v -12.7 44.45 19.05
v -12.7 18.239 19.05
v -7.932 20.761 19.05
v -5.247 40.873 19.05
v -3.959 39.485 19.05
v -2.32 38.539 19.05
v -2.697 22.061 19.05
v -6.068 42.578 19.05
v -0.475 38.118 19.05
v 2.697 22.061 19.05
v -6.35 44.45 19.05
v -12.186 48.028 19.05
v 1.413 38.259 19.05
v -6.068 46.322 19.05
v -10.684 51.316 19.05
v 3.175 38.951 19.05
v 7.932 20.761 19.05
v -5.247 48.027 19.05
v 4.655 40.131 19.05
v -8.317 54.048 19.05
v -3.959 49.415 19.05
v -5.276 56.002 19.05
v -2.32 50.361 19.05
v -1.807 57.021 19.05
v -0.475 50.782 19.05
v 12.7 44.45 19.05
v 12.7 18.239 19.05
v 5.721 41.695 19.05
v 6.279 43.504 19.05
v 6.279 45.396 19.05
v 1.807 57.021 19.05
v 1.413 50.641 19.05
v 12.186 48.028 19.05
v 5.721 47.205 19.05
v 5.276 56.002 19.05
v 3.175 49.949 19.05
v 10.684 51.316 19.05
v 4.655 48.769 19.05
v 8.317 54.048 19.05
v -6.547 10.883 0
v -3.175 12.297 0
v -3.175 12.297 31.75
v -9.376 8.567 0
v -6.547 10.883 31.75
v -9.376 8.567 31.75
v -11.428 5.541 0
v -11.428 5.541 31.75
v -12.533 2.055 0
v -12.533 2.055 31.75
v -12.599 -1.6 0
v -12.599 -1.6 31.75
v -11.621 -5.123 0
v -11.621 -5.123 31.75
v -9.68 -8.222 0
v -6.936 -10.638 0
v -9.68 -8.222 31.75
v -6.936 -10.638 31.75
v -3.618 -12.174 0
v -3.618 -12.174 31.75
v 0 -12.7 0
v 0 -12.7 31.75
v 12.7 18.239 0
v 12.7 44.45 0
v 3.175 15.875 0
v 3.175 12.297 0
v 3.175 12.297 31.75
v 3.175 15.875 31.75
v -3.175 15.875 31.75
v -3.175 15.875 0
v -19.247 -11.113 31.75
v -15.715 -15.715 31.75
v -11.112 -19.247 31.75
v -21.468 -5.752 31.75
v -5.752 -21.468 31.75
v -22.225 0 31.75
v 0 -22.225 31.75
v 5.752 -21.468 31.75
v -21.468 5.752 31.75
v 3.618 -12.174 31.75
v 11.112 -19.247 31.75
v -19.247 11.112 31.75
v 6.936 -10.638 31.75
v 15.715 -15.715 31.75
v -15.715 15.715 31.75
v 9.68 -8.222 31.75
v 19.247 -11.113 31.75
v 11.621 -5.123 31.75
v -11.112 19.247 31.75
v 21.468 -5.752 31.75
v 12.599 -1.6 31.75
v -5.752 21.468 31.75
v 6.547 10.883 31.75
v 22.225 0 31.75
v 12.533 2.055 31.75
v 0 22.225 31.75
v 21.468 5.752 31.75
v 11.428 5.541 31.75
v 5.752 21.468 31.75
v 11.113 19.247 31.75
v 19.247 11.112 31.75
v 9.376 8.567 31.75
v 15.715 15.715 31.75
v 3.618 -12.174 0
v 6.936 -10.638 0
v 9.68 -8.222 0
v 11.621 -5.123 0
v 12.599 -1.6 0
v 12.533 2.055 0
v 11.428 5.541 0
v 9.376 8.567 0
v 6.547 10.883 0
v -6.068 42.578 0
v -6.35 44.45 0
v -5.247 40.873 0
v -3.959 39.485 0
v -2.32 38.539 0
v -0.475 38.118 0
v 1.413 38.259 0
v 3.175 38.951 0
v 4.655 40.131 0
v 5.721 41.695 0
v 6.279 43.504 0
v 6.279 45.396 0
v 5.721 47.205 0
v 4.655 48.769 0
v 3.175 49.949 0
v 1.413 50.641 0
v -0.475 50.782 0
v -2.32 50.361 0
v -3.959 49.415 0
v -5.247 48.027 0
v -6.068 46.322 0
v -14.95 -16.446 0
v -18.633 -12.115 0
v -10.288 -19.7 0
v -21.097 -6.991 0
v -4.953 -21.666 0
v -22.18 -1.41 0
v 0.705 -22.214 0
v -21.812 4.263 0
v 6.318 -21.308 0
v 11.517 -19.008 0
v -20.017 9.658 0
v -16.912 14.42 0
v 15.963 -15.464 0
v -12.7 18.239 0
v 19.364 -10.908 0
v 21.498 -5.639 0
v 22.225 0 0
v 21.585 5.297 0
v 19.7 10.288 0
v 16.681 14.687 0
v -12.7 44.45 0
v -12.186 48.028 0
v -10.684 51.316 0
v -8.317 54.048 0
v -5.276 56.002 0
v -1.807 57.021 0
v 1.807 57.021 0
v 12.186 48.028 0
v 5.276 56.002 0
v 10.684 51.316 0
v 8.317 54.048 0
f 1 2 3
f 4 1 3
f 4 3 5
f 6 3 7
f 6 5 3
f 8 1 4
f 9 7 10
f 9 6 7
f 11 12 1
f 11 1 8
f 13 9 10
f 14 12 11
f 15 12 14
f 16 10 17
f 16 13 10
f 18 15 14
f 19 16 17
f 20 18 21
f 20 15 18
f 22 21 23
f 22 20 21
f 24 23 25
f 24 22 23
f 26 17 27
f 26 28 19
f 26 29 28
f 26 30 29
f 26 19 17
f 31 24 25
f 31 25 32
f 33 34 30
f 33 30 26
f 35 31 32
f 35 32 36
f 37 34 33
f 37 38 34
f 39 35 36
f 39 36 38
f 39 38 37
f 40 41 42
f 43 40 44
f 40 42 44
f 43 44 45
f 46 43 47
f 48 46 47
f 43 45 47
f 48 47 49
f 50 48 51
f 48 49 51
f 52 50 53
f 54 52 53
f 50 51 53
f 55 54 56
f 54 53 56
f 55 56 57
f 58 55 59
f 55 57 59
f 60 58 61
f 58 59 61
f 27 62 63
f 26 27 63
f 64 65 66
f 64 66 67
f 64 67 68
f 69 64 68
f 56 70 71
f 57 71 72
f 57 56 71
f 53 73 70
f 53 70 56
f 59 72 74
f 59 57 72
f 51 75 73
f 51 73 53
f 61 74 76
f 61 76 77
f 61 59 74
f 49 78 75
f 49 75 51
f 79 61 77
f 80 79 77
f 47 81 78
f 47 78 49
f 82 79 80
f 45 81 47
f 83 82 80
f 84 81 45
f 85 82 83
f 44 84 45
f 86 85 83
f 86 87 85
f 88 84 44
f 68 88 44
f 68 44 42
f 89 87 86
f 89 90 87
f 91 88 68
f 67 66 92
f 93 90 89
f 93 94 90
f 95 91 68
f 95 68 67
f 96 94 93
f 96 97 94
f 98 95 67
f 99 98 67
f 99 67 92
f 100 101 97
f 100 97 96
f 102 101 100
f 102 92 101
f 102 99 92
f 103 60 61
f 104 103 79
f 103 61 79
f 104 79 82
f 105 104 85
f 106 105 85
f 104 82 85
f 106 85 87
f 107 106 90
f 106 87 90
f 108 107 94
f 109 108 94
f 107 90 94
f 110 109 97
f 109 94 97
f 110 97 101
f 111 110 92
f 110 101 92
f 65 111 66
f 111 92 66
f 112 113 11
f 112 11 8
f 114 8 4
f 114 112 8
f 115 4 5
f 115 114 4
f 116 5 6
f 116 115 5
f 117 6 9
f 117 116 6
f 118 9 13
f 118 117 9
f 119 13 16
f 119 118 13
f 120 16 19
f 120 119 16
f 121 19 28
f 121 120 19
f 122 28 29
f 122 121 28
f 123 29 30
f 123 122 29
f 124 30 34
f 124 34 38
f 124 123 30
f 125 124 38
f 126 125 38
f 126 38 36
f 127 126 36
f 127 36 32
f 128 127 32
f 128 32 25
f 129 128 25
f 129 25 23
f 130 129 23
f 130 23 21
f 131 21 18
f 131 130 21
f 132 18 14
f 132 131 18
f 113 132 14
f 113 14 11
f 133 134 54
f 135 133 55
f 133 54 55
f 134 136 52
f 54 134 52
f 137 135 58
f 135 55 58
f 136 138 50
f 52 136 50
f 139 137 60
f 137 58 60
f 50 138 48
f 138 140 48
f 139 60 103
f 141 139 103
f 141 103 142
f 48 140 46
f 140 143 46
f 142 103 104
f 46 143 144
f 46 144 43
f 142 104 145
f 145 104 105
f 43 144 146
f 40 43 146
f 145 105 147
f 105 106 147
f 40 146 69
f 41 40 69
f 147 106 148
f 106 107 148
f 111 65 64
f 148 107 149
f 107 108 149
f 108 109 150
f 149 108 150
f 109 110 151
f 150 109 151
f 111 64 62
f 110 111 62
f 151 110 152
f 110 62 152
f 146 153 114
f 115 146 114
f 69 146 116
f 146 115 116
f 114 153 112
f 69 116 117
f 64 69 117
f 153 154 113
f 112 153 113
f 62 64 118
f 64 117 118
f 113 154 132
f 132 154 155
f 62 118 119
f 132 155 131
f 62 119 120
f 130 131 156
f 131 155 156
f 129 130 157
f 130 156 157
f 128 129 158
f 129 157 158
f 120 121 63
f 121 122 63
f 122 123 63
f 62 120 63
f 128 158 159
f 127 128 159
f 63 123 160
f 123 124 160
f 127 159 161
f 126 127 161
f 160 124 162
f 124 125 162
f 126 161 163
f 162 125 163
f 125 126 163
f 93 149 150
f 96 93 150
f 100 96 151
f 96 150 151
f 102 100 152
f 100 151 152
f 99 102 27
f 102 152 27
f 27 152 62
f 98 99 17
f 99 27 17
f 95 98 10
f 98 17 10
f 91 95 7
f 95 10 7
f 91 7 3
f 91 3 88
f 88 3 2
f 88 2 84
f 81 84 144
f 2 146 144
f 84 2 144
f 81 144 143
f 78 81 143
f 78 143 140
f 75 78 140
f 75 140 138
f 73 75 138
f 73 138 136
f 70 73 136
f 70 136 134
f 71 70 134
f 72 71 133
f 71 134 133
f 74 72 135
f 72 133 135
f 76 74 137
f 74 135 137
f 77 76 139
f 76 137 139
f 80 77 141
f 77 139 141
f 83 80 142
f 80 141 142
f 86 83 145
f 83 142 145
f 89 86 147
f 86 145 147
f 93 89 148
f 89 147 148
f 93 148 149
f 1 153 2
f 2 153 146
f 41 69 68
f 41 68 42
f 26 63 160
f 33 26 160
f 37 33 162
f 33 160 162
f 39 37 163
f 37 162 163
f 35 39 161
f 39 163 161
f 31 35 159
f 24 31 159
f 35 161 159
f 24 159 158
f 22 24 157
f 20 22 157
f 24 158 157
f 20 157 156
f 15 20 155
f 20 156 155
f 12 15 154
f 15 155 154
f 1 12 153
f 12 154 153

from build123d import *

# Parameters (mm, degrees)
SKETCH1_R           = 22.225
BOSS_EXTRUDE1_DEPTH = 31.75
SKETCH1_3_R         = 6.35
BOSS_EXTRUDE2_DEPTH = 19.05
CUT_EXTRUDE1_DEPTH  = 70.051688068


with BuildPart() as part:
    # Sketch1 → Boss-Extrude1 (new body)
    with BuildSketch(Plane.XY):
        Circle(SKETCH1_R)
    extrude(amount=BOSS_EXTRUDE1_DEPTH)

    # Sketch1<3> → Boss-Extrude2 (add)
    with BuildSketch(Plane.XY):
        with BuildLine():
            ThreePointArc((12.7, 44.45), (0, 57.15), (-12.7, 44.45))
            Line((-12.7, 44.45), (-12.7, 18.238986403))
            ThreePointArc((-12.7, 18.238986403), (0, 22.225), (12.7, 18.238986403))
            Line((12.7, 18.238986403), (12.7, 44.45))
        make_face()
        with Locations(Location((0, 44.45, 0), (0, 0, 180))):
            Circle(SKETCH1_3_R, mode=Mode.SUBTRACT)
    extrude(amount=BOSS_EXTRUDE2_DEPTH)

    # Sketch2 → Cut-Extrude1 (cut, through all)
    with BuildSketch(Plane.XY.offset(31.75)):
        with BuildLine():
            Line((0, 15.875), (0, -12.7))
            ThreePointArc((0, -12.7), (12.598777143, -1.600254515), (3.175, 12.296722124))
            Line((3.175, 12.296722124), (3.175, 15.875))
            Line((3.175, 15.875), (0, 15.875))
        make_face()
        with BuildLine():
            ThreePointArc((-3.175, 12.296722124), (-12.598777143, -1.600254515), (0, -12.7))
            Line((0, -12.7), (0, 15.875))
            Line((0, 15.875), (-3.175, 15.875))
            Line((-3.175, 15.875), (-3.175, 12.296722124))
        make_face()
    extrude(amount=-CUT_EXTRUDE1_DEPTH, mode=Mode.SUBTRACT)


solid = part.part
